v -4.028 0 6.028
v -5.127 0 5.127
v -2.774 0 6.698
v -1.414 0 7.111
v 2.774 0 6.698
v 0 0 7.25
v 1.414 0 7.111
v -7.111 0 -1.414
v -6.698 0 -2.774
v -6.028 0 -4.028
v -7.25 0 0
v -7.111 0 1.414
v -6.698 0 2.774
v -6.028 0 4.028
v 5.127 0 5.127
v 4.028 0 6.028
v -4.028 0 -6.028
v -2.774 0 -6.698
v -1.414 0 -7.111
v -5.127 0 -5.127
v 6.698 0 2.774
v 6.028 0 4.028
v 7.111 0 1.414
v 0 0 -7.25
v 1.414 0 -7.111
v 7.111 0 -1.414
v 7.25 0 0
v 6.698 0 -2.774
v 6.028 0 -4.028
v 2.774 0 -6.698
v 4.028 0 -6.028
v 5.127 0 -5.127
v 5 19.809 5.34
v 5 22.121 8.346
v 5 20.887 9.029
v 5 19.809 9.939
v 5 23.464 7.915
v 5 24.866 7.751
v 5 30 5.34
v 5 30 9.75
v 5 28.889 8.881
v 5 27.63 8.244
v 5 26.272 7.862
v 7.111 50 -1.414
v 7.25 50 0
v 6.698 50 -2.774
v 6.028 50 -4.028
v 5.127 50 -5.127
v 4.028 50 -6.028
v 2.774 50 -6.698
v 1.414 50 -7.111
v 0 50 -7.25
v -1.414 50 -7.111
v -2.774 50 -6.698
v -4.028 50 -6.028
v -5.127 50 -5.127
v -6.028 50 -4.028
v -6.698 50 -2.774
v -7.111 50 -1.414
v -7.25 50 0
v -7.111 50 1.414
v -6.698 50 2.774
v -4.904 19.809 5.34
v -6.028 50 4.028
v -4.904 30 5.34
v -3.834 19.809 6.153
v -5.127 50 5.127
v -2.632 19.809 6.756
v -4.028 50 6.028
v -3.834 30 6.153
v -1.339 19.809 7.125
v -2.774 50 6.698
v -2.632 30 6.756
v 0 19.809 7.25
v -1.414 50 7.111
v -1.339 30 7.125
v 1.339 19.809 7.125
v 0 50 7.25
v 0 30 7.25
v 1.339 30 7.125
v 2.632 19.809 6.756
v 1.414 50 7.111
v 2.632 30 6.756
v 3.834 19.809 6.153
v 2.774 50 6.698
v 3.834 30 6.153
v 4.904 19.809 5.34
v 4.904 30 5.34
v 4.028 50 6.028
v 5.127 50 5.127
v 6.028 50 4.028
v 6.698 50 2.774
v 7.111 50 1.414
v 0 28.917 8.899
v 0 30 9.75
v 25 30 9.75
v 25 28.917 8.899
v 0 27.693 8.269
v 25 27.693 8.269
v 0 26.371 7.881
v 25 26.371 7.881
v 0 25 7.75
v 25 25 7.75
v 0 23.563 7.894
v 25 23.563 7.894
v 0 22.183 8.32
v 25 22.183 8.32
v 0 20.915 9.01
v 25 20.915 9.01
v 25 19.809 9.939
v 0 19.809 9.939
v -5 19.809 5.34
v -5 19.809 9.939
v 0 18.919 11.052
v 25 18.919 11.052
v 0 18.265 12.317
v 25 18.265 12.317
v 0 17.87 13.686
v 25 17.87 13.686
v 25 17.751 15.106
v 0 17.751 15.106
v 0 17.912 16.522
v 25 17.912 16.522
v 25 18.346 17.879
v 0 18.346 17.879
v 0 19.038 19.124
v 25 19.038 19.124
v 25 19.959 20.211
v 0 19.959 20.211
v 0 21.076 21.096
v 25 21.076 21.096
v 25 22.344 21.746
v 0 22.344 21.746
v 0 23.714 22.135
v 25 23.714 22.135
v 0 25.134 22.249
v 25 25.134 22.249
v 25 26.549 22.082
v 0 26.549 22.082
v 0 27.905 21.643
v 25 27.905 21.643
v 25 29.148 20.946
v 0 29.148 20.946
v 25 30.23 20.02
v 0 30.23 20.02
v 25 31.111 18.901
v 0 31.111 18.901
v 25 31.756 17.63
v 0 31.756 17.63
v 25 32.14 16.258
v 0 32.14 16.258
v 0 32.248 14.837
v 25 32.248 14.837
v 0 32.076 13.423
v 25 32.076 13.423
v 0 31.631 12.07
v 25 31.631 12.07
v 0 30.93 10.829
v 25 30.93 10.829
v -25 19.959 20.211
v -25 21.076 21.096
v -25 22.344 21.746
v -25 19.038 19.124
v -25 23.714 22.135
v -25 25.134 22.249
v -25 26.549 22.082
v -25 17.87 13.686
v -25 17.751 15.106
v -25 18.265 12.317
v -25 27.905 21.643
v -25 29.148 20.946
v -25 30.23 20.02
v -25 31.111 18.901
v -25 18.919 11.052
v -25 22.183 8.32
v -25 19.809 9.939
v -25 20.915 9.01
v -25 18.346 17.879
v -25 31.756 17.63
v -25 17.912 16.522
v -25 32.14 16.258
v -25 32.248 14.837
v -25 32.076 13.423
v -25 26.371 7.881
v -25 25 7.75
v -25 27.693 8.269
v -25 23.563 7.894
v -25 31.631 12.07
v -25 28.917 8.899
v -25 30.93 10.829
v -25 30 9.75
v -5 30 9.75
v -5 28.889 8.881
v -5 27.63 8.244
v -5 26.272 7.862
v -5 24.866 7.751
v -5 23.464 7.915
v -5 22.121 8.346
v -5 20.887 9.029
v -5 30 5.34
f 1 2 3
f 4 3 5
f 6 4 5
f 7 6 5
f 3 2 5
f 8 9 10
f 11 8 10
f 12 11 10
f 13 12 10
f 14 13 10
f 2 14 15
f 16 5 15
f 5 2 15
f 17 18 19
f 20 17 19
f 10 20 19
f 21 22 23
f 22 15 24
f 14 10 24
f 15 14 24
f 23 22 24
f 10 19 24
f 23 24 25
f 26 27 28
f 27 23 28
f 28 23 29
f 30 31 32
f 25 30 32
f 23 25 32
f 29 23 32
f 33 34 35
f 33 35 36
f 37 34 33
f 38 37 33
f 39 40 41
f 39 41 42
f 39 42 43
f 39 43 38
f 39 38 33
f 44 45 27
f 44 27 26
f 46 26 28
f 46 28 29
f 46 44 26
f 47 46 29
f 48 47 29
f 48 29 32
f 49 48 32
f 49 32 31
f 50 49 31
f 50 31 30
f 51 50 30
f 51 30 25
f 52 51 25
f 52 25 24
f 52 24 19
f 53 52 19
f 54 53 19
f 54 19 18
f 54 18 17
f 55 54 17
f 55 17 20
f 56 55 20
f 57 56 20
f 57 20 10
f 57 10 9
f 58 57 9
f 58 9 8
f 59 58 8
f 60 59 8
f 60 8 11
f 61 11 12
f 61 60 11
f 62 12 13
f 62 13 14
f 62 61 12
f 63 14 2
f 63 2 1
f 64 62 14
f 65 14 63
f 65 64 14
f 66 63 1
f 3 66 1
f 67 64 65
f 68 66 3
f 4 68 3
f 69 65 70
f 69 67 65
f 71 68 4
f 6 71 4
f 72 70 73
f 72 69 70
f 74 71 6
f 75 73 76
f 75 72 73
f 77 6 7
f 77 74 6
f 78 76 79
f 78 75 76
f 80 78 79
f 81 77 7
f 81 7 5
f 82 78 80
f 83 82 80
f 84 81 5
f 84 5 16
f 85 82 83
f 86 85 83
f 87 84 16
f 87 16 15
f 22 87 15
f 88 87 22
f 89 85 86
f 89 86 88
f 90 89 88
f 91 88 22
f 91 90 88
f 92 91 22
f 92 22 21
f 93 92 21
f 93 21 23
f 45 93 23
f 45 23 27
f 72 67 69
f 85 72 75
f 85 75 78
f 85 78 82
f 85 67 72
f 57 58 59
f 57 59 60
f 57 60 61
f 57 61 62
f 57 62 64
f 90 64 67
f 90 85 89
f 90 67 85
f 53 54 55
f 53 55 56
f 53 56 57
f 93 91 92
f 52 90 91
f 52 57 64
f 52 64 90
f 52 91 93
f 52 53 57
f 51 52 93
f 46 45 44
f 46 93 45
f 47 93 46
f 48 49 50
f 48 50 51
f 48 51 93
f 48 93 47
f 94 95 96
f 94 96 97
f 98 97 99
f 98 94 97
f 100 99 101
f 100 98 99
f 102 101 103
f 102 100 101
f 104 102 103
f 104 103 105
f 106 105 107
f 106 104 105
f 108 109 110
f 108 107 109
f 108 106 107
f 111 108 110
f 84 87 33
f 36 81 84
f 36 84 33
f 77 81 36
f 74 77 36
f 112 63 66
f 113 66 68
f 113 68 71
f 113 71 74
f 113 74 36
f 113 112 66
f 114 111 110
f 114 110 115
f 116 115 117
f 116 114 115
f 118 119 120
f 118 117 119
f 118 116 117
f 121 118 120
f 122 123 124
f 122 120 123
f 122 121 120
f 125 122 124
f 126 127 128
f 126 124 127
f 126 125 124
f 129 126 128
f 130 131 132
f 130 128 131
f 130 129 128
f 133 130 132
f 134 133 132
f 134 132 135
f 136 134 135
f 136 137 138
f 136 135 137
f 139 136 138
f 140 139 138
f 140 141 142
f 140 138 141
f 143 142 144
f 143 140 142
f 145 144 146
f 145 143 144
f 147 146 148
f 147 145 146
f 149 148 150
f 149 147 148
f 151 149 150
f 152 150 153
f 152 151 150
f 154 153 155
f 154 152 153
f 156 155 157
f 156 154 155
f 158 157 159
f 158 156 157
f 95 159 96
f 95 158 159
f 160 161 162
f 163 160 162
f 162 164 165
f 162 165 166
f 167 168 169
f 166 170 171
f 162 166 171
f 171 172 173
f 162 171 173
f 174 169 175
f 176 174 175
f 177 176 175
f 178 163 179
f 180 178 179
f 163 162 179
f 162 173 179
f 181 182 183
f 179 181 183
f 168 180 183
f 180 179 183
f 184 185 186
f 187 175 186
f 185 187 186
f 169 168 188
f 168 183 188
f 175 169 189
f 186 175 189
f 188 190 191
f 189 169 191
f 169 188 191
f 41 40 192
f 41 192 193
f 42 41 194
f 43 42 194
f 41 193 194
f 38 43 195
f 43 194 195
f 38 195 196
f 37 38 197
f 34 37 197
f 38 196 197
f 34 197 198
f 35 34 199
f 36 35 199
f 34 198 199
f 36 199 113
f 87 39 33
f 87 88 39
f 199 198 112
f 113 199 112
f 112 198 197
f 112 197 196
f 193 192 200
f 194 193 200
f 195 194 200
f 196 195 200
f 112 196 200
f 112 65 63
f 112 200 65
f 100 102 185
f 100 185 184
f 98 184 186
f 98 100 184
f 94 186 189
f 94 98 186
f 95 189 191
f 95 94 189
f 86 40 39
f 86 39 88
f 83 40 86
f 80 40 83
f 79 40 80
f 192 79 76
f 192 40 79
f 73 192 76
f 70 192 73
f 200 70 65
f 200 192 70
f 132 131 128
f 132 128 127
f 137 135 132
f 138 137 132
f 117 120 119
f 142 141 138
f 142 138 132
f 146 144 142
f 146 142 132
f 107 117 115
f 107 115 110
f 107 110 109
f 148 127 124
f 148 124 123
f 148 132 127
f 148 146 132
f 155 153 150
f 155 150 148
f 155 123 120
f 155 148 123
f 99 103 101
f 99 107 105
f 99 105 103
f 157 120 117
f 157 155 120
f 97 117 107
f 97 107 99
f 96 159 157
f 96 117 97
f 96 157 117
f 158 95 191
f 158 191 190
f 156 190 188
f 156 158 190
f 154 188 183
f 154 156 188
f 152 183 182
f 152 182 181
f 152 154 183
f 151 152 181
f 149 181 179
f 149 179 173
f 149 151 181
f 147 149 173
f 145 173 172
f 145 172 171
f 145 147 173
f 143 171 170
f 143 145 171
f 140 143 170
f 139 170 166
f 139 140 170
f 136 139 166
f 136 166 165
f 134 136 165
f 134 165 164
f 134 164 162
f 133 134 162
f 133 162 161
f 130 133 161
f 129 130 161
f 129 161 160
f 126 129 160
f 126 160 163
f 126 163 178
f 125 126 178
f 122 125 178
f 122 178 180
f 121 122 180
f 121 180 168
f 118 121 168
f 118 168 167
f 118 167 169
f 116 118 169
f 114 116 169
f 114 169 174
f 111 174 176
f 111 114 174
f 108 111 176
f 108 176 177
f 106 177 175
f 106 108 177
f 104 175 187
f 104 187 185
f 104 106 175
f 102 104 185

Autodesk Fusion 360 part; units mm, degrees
cylinder "CylinderPrimitive1" add diameter 14.5 height 50 placed x (1, 0, 0) y (0, 0, -1) z (0, 1, 0) at (0, 0, 0) makes body 1
sketch "Sketch6" plane through (0, 0, 0) normal (1, 0, 0) x (0, 0, -1)
  circle A0 centre (-15, 25) radius 7.25
  line L0 (-9.75, 30) -> (-6.3397, 30)
  line L1 (-6.3397, 30) -> (-6.3397, 19.8088)
  line L2 (-6.3397, 19.8088) -> (-9.939, 19.8088)
  dimension "d10" = 14.5
extrude "Extrude3" add sketch "Sketch6" along normal mid plane 10 contours A0 L0 L1 L2 bodies 1
extrude "Extrude2" add sketch "Sketch6" along normal mid plane 50 separate body contours A0 makes body 2
move_face "OffsetFaces1" offset 1 1 faces at (4.0114, 26.6029, 6.3397) on bodies 1
move_face "OffsetFaces2" offset 1 1 faces at (-4.5057, 26.6029, 6.3397) on bodies 1
